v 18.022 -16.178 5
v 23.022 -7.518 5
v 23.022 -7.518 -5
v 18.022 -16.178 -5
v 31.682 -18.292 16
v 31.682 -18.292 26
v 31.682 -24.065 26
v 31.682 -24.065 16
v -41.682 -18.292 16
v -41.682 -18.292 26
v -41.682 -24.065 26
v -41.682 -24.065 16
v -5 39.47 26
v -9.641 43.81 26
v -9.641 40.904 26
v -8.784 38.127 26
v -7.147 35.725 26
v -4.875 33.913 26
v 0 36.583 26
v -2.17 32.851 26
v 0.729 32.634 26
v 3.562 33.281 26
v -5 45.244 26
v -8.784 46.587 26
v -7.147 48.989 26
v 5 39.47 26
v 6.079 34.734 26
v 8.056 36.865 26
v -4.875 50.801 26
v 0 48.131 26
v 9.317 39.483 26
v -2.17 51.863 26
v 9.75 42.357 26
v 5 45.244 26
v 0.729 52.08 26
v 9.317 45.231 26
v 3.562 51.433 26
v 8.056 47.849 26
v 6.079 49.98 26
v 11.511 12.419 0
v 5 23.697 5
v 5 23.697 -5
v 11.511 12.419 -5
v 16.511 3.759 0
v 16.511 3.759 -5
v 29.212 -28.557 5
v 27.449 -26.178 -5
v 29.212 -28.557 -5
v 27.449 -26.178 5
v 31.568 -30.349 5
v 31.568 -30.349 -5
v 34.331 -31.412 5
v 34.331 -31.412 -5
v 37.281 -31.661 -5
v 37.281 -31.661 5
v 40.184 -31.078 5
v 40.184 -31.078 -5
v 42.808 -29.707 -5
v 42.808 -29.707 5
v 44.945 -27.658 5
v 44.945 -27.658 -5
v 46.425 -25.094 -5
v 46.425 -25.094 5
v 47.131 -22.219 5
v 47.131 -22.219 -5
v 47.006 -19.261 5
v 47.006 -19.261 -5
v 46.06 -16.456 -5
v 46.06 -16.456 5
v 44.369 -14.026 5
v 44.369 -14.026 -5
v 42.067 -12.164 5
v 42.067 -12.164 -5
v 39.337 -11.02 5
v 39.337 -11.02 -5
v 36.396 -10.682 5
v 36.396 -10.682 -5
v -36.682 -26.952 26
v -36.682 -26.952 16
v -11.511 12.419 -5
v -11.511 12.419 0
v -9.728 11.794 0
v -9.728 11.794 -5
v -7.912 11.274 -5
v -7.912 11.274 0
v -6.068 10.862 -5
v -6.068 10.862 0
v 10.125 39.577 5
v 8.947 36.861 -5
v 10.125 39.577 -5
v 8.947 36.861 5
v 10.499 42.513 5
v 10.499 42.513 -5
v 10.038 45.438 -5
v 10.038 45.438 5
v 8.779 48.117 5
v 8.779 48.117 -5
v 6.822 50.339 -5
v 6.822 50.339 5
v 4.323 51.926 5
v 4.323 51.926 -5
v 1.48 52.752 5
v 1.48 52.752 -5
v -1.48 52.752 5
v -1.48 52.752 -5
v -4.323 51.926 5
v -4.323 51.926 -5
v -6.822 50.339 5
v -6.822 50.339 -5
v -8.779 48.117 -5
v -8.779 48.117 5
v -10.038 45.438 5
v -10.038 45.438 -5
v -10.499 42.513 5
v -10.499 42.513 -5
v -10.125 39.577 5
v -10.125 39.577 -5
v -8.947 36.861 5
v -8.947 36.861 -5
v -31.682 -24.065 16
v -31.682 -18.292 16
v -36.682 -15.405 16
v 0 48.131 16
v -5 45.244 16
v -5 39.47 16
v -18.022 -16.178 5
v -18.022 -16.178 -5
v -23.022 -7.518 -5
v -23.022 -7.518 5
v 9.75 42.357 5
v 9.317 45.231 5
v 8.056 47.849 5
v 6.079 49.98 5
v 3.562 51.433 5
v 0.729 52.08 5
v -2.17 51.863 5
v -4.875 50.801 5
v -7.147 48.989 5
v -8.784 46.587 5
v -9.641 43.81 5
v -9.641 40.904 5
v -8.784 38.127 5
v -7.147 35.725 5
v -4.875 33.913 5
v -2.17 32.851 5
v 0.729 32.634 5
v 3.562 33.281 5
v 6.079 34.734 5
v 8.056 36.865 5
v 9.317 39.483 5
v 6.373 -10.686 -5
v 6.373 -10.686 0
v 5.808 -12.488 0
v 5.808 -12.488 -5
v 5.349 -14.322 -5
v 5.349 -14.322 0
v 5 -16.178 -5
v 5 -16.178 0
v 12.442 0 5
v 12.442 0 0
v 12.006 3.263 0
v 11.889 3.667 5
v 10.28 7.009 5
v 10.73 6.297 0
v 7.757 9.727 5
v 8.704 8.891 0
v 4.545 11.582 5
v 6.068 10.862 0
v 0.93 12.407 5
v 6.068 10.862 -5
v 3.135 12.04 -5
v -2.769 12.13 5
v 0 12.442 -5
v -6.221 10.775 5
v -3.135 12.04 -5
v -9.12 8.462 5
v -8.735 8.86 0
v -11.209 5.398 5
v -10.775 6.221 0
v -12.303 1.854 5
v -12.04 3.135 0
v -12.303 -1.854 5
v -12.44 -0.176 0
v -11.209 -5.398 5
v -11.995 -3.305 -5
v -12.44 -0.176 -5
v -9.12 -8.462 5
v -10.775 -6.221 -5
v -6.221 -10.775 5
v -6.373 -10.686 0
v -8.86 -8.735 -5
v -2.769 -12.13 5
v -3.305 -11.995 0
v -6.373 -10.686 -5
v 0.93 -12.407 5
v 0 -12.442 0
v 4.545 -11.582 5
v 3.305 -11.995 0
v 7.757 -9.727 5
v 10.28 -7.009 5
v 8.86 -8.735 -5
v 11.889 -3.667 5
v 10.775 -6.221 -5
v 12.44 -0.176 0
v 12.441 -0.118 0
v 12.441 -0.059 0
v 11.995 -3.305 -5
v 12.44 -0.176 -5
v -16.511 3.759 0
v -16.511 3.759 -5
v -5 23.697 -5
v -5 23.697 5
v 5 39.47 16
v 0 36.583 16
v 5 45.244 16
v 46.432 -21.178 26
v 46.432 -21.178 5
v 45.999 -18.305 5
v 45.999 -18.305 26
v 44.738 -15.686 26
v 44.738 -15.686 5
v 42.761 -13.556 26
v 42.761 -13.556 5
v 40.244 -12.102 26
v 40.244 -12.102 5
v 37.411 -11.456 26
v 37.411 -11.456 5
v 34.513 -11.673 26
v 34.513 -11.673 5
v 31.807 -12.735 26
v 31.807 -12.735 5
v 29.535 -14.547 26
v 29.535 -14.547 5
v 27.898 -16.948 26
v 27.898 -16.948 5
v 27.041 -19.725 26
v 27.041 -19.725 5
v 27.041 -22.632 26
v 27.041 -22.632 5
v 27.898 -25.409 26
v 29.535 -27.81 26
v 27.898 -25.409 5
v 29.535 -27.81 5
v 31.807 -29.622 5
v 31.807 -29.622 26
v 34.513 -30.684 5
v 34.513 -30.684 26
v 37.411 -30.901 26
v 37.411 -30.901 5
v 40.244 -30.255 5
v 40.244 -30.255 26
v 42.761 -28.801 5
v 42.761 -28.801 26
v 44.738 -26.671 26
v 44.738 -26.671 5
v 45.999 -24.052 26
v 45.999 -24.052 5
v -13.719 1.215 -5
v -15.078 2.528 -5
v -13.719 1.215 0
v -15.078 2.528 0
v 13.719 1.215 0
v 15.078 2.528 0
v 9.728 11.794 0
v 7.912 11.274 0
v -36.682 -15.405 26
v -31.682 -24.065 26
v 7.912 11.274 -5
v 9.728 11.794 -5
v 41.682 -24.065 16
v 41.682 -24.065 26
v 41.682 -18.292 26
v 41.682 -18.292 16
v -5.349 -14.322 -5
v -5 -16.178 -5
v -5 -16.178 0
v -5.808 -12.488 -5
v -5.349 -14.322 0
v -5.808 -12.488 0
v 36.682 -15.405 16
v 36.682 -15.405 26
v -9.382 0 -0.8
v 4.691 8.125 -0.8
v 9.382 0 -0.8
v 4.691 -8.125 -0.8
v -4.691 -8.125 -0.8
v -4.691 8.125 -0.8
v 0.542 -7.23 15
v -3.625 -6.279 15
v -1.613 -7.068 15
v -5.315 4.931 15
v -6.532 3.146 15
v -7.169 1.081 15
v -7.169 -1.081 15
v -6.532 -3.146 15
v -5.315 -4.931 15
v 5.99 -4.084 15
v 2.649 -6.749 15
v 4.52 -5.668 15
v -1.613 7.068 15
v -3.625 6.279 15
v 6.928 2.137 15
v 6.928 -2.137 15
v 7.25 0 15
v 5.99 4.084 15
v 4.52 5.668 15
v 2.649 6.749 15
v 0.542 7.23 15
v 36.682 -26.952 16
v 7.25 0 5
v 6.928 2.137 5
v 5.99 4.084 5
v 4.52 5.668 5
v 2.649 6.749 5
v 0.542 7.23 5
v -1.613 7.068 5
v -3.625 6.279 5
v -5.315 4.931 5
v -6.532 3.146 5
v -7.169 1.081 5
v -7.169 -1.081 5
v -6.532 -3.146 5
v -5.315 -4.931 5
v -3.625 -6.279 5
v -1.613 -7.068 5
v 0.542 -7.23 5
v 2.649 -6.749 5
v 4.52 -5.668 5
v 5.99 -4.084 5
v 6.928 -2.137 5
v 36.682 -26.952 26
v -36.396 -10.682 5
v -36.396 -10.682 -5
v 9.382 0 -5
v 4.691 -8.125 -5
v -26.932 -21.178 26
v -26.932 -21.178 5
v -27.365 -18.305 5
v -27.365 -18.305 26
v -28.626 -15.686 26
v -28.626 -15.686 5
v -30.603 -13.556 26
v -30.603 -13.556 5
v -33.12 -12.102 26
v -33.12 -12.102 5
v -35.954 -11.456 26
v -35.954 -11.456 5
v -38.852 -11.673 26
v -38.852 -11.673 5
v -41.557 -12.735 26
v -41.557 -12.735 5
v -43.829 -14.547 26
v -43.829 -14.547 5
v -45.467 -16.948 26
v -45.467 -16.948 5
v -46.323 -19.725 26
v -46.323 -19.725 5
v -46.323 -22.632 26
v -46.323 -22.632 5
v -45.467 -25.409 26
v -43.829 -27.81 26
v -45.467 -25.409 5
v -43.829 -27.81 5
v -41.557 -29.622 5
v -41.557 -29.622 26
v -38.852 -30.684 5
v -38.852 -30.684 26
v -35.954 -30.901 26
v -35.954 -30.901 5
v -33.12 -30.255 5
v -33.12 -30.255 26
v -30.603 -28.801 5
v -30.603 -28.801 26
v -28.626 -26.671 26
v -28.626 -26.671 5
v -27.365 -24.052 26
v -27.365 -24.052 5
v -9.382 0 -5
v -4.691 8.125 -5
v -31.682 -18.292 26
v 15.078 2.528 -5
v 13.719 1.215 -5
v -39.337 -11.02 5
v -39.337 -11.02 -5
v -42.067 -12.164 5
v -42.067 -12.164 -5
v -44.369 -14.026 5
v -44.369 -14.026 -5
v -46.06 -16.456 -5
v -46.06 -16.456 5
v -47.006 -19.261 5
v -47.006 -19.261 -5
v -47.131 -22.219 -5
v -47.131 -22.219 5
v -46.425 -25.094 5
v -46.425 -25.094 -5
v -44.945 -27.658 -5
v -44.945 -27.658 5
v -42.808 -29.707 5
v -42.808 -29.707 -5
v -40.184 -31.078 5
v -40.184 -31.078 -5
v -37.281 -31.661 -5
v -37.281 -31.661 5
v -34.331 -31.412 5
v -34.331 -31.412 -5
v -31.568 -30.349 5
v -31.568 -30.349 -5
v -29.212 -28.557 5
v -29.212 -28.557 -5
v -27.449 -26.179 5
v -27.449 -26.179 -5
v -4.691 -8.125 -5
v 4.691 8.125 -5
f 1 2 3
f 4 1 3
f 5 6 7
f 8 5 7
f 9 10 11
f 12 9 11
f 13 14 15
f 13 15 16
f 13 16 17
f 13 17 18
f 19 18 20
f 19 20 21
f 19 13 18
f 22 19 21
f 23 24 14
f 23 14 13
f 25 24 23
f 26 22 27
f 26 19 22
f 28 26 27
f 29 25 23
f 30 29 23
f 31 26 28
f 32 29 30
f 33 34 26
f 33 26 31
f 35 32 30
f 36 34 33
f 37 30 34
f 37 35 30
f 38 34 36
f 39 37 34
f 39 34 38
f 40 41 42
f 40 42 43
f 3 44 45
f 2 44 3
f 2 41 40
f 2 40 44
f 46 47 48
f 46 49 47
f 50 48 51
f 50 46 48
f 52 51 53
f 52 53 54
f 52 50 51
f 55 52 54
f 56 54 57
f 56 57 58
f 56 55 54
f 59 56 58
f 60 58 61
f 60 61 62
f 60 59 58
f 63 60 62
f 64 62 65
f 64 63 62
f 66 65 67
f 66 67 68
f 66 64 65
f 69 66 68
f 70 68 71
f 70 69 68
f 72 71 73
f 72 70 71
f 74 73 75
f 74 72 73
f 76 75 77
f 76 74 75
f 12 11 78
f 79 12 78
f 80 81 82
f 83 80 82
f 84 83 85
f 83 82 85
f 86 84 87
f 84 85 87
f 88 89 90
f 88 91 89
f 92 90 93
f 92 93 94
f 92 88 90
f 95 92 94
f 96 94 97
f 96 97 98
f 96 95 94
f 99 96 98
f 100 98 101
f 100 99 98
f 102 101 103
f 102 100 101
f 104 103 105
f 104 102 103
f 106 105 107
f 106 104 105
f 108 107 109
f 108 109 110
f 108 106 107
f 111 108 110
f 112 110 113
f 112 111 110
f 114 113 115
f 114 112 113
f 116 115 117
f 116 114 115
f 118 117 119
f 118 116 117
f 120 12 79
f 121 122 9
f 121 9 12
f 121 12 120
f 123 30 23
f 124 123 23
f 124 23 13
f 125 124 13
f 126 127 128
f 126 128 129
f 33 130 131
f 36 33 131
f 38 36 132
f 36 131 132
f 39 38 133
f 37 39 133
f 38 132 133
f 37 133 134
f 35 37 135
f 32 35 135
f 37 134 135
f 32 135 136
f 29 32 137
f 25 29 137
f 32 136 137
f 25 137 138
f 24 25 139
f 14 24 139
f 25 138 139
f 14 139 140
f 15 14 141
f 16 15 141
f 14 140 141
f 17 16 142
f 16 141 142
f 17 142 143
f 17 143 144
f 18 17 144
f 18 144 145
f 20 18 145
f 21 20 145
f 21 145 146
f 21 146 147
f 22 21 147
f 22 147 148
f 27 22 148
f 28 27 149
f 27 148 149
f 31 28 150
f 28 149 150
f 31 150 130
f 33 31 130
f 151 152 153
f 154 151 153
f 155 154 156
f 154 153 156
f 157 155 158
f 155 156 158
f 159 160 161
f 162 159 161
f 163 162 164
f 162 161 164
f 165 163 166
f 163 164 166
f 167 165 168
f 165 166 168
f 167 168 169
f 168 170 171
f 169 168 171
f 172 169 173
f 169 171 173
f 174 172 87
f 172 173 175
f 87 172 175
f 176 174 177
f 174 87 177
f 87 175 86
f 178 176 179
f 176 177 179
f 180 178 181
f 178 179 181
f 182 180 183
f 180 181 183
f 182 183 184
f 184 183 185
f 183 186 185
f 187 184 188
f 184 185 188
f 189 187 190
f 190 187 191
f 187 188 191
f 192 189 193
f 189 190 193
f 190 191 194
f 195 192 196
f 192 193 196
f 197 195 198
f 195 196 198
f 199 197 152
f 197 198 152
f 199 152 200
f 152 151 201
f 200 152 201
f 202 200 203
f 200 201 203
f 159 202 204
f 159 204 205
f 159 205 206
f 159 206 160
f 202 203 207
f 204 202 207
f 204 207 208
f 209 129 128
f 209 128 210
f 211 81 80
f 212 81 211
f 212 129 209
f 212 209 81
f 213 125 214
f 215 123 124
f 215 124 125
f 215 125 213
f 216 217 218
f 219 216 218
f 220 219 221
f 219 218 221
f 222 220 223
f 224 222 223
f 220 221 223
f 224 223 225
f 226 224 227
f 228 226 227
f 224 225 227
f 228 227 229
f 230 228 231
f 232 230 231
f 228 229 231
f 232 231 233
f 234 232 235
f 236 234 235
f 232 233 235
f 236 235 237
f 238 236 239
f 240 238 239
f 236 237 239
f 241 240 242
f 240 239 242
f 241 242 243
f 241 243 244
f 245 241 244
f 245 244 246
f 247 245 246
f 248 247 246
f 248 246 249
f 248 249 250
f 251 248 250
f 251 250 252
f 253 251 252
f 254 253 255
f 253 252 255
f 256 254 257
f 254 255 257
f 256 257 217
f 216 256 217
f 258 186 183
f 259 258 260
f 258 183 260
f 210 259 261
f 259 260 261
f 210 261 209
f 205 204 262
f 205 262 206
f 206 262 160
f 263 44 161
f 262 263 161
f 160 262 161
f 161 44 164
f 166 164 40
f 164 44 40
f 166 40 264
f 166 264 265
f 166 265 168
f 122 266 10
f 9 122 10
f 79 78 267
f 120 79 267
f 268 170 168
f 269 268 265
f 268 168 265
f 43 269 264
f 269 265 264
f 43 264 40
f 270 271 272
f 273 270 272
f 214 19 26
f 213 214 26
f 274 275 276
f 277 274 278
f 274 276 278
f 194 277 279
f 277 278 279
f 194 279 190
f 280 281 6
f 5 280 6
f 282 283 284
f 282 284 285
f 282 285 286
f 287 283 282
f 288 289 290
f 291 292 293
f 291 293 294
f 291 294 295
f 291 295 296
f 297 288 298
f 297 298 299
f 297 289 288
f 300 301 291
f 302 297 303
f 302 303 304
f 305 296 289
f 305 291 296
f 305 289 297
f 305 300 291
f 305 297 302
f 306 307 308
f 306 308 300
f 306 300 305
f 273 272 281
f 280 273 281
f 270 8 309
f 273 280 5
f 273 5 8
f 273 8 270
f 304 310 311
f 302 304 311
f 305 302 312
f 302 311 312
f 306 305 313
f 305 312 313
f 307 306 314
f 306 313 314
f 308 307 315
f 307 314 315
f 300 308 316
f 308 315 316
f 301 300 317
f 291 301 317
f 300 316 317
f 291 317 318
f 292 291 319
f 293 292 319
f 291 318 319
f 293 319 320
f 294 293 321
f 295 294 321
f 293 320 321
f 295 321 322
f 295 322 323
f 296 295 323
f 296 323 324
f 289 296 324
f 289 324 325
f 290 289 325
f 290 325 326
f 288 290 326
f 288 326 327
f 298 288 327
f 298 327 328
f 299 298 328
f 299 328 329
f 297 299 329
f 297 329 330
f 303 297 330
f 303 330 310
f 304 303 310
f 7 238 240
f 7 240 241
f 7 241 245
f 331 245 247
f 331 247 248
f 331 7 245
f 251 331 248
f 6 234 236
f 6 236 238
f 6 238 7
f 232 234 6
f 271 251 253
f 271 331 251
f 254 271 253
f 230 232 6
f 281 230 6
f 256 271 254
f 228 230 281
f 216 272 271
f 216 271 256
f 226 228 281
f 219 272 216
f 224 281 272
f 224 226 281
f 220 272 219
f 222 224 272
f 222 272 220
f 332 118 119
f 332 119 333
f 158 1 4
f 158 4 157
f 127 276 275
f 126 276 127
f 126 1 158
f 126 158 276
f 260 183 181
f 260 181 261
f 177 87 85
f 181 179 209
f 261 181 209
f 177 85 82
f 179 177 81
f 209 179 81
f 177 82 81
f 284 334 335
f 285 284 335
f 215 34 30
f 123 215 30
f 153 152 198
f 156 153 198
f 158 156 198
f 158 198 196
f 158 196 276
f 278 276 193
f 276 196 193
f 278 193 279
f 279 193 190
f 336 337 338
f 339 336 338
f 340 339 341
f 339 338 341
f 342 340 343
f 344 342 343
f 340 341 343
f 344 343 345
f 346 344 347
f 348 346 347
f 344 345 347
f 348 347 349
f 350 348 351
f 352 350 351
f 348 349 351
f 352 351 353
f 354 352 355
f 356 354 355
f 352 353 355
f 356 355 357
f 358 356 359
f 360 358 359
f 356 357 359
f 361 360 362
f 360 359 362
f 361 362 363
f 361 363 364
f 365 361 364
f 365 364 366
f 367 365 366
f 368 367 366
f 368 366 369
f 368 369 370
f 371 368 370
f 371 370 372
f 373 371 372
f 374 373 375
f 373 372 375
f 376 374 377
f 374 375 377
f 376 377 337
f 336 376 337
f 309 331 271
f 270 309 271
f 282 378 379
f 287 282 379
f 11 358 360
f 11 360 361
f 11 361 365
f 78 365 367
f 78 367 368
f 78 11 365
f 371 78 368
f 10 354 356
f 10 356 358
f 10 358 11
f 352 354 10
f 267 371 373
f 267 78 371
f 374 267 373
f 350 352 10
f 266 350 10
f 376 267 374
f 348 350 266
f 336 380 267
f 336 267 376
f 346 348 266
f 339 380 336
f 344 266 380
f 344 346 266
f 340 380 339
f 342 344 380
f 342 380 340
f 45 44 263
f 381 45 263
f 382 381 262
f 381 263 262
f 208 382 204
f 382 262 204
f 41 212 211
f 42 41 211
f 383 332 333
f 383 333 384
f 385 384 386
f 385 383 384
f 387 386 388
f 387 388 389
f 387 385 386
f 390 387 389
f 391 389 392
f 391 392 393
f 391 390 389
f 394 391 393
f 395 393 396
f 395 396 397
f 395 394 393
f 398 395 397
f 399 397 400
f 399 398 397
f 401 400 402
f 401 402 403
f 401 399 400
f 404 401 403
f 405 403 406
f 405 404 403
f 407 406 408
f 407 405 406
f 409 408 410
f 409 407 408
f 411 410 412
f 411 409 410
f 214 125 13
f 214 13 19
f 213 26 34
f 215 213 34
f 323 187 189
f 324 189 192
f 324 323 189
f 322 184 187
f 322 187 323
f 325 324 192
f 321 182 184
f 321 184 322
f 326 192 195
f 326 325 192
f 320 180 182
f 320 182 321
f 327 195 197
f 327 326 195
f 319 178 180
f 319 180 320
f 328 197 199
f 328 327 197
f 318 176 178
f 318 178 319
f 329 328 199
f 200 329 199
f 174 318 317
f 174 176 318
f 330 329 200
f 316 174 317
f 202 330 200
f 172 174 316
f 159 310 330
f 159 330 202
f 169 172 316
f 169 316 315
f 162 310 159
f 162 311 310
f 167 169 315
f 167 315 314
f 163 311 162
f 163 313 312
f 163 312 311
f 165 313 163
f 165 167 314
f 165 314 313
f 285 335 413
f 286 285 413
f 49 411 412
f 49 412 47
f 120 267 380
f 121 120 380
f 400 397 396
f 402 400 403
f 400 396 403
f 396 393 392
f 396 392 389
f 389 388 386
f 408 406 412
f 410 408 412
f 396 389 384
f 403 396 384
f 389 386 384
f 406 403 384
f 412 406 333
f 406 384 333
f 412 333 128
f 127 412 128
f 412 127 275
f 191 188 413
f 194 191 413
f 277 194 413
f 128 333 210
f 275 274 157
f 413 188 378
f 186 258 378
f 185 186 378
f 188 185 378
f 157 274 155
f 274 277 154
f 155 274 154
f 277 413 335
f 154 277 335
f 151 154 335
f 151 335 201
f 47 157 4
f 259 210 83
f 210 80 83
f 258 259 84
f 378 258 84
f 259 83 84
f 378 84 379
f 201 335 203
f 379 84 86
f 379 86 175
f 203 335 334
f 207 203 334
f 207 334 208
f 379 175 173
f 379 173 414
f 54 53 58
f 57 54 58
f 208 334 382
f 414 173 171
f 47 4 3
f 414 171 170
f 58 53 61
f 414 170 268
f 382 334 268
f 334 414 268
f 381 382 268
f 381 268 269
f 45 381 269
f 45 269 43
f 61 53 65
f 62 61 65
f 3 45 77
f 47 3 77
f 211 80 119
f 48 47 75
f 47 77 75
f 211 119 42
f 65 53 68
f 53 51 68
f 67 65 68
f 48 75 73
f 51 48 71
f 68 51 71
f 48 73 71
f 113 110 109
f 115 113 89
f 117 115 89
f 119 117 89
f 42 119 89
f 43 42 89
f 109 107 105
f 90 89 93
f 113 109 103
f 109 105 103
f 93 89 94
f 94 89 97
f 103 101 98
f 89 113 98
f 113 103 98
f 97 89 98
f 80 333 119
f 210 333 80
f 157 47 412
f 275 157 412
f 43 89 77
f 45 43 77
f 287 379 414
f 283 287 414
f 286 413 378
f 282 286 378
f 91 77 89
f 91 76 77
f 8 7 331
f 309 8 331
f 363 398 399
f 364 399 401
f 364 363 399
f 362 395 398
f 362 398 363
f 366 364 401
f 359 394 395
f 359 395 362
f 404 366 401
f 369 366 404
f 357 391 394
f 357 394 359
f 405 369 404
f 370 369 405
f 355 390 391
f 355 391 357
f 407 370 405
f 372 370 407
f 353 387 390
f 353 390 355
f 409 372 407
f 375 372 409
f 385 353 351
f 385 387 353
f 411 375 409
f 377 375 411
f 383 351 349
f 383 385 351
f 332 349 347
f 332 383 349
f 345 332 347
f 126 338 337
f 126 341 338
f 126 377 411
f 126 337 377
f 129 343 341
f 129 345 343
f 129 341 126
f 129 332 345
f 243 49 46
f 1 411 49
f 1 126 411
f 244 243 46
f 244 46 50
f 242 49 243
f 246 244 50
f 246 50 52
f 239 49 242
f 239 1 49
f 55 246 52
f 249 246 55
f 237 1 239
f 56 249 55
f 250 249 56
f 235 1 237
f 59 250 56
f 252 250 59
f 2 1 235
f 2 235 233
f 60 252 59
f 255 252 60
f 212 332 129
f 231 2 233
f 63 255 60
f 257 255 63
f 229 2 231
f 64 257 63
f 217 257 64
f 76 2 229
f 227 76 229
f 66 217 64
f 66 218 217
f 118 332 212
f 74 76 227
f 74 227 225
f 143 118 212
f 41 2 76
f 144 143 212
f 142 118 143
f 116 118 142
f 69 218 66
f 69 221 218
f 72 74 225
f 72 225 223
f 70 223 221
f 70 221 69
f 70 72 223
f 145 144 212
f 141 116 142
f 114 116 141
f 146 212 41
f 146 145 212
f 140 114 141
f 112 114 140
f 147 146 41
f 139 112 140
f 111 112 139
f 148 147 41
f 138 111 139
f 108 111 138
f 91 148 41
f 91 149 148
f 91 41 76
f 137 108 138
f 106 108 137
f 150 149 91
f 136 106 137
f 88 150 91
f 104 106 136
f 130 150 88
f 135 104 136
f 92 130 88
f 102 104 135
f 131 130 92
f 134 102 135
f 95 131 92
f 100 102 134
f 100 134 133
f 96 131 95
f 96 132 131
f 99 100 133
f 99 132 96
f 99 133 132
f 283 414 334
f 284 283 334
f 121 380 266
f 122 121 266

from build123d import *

# Parameters (mm, degrees)
BOSS_EXTRUDE1_DEPTH = 5
BOSS_EXTRUDE2_DEPTH = 5
SKETCH4_R           = 9.75
BOSS_EXTRUDE3_DEPTH = 21
BOSS_EXTRUDE4_START = -5
SKETCH5_R           = 12.441578391
BOSS_EXTRUDE4_DEPTH = 10
SKETCH5_3_R         = 7.25
BOSS_EXTRUDE5_DEPTH = 15
CHAMFER1_SIZE       = 10
CUT_EXTRUDE1_DEPTH  = 10
CUT_EXTRUDE2_DEPTH  = 4.2


with BuildPart() as part:
    # Sketch2 → Boss-Extrude1 (new body, symmetric)
    with BuildSketch(Plane.XY):
        with BuildLine():
            ThreePointArc((8.946673347, 36.860907204), (0, 52.857), (-8.946673347, 36.860907204))
            Line((-8.946673347, 36.860907204), (-36.395818719, -10.682407204))
            ThreePointArc((-36.395818719, -10.682407204), (-45.775504768, -26.4285), (-27.449145372, -26.1785))
            Line((-27.449145372, -26.1785), (27.449145372, -26.1785))
            ThreePointArc((27.449145372, -26.1785), (45.775504768, -26.4285), (36.395818719, -10.682407204))
            Line((36.395818719, -10.682407204), (8.946673347, 36.860907204))
        make_face()
        Polygon((-28.02198399, -16.1785), (0, 32.357), (28.02198399, -16.1785), align=None, mode=Mode.SUBTRACT)
    extrude(amount=BOSS_EXTRUDE1_DEPTH, both=True)

    # Sketch3 → Boss-Extrude2 (add)
    with BuildSketch(Plane.XY):
        with BuildLine():
            Line((-16.510991995, 3.759122981), (-11.510991995, 12.419377019))
            ThreePointArc((-11.510991995, 12.419377019), (0, 10.282645658), (11.510991995, 12.419377019))
            Line((11.510991995, 12.419377019), (16.510991995, 3.759122981))
            ThreePointArc((16.510991995, 3.759122981), (8.905032358, -5.141322829), (5, -16.1785))
            Line((5, -16.1785), (-5, -16.1785))
            ThreePointArc((-5, -16.1785), (-8.905032358, -5.141322829), (-16.510991995, 3.759122981))
        make_face()
    extrude(amount=-BOSS_EXTRUDE2_DEPTH)

    # Sketch4 → Boss-Extrude3 (add)
    with BuildSketch(Plane.XY.offset(5)):
        with Locations((-36.682238028, -21.1785)):
            Circle(SKETCH4_R)
        with Locations((36.682238028, -21.1785)):
            Circle(SKETCH4_R)
        with Locations((0, 42.357)):
            Circle(SKETCH4_R)
    extrude(amount=BOSS_EXTRUDE3_DEPTH)

    # Sketch5 → Boss-Extrude4 (add)
    with BuildSketch(Plane.XY.offset(BOSS_EXTRUDE4_START)):
        Circle(SKETCH5_R)
    extrude(amount=BOSS_EXTRUDE4_DEPTH)

    # Sketch5<3> → Boss-Extrude5 (add)
    with BuildSketch(Plane.XY):
        Circle(SKETCH5_3_R)
    extrude(amount=BOSS_EXTRUDE5_DEPTH)

    # Chamfer1
    chamfer1_edges = [part.edges().sort_by_distance(p)[0] for p in [
        (28.02198399, -16.1785, 0),
        (-28.02198399, -16.1785, 0),
        (0, 32.357, 0),
    ]]
    chamfer(chamfer1_edges, length=CHAMFER1_SIZE)

    # Sketch8 → Cut-Extrude1 (cut)
    with BuildSketch(Plane.XY.offset(26)):
        Polygon((-41.682238028, -24.065251346), (-36.682238028, -26.952002692), (-31.682238028, -24.065251346), (-31.682238028, -18.291748654), (-36.682238028, -15.404997308), (-41.682238028, -18.291748654), align=None)
        Polygon((41.682238028, -24.065251346), (41.682238028, -18.291748654), (36.682238028, -15.404997308), (31.682238028, -18.291748654), (31.682238028, -24.065251346), (36.682238028, -26.952002692), align=None)
        Polygon((0, 48.130502692), (-5, 45.243751346), (-5, 39.470248654), (0, 36.583497308), (5, 39.470248654), (5, 45.243751346), align=None)
    extrude(amount=-CUT_EXTRUDE1_DEPTH, mode=Mode.SUBTRACT)

    # Sketch10 → Cut-Extrude2 (cut)
    with BuildSketch(Plane(origin=(0, 0, -5), x_dir=(-1, 0, 0), z_dir=(0, 0, -1))):
        Polygon((9.381941874, 0), (4.690970937, 8.125), (-4.690970937, 8.125), (-9.381941874, 0), (-4.690970937, -8.125), (4.690970937, -8.125), align=None)
    extrude(amount=-CUT_EXTRUDE2_DEPTH, mode=Mode.SUBTRACT)


solid = part.part
